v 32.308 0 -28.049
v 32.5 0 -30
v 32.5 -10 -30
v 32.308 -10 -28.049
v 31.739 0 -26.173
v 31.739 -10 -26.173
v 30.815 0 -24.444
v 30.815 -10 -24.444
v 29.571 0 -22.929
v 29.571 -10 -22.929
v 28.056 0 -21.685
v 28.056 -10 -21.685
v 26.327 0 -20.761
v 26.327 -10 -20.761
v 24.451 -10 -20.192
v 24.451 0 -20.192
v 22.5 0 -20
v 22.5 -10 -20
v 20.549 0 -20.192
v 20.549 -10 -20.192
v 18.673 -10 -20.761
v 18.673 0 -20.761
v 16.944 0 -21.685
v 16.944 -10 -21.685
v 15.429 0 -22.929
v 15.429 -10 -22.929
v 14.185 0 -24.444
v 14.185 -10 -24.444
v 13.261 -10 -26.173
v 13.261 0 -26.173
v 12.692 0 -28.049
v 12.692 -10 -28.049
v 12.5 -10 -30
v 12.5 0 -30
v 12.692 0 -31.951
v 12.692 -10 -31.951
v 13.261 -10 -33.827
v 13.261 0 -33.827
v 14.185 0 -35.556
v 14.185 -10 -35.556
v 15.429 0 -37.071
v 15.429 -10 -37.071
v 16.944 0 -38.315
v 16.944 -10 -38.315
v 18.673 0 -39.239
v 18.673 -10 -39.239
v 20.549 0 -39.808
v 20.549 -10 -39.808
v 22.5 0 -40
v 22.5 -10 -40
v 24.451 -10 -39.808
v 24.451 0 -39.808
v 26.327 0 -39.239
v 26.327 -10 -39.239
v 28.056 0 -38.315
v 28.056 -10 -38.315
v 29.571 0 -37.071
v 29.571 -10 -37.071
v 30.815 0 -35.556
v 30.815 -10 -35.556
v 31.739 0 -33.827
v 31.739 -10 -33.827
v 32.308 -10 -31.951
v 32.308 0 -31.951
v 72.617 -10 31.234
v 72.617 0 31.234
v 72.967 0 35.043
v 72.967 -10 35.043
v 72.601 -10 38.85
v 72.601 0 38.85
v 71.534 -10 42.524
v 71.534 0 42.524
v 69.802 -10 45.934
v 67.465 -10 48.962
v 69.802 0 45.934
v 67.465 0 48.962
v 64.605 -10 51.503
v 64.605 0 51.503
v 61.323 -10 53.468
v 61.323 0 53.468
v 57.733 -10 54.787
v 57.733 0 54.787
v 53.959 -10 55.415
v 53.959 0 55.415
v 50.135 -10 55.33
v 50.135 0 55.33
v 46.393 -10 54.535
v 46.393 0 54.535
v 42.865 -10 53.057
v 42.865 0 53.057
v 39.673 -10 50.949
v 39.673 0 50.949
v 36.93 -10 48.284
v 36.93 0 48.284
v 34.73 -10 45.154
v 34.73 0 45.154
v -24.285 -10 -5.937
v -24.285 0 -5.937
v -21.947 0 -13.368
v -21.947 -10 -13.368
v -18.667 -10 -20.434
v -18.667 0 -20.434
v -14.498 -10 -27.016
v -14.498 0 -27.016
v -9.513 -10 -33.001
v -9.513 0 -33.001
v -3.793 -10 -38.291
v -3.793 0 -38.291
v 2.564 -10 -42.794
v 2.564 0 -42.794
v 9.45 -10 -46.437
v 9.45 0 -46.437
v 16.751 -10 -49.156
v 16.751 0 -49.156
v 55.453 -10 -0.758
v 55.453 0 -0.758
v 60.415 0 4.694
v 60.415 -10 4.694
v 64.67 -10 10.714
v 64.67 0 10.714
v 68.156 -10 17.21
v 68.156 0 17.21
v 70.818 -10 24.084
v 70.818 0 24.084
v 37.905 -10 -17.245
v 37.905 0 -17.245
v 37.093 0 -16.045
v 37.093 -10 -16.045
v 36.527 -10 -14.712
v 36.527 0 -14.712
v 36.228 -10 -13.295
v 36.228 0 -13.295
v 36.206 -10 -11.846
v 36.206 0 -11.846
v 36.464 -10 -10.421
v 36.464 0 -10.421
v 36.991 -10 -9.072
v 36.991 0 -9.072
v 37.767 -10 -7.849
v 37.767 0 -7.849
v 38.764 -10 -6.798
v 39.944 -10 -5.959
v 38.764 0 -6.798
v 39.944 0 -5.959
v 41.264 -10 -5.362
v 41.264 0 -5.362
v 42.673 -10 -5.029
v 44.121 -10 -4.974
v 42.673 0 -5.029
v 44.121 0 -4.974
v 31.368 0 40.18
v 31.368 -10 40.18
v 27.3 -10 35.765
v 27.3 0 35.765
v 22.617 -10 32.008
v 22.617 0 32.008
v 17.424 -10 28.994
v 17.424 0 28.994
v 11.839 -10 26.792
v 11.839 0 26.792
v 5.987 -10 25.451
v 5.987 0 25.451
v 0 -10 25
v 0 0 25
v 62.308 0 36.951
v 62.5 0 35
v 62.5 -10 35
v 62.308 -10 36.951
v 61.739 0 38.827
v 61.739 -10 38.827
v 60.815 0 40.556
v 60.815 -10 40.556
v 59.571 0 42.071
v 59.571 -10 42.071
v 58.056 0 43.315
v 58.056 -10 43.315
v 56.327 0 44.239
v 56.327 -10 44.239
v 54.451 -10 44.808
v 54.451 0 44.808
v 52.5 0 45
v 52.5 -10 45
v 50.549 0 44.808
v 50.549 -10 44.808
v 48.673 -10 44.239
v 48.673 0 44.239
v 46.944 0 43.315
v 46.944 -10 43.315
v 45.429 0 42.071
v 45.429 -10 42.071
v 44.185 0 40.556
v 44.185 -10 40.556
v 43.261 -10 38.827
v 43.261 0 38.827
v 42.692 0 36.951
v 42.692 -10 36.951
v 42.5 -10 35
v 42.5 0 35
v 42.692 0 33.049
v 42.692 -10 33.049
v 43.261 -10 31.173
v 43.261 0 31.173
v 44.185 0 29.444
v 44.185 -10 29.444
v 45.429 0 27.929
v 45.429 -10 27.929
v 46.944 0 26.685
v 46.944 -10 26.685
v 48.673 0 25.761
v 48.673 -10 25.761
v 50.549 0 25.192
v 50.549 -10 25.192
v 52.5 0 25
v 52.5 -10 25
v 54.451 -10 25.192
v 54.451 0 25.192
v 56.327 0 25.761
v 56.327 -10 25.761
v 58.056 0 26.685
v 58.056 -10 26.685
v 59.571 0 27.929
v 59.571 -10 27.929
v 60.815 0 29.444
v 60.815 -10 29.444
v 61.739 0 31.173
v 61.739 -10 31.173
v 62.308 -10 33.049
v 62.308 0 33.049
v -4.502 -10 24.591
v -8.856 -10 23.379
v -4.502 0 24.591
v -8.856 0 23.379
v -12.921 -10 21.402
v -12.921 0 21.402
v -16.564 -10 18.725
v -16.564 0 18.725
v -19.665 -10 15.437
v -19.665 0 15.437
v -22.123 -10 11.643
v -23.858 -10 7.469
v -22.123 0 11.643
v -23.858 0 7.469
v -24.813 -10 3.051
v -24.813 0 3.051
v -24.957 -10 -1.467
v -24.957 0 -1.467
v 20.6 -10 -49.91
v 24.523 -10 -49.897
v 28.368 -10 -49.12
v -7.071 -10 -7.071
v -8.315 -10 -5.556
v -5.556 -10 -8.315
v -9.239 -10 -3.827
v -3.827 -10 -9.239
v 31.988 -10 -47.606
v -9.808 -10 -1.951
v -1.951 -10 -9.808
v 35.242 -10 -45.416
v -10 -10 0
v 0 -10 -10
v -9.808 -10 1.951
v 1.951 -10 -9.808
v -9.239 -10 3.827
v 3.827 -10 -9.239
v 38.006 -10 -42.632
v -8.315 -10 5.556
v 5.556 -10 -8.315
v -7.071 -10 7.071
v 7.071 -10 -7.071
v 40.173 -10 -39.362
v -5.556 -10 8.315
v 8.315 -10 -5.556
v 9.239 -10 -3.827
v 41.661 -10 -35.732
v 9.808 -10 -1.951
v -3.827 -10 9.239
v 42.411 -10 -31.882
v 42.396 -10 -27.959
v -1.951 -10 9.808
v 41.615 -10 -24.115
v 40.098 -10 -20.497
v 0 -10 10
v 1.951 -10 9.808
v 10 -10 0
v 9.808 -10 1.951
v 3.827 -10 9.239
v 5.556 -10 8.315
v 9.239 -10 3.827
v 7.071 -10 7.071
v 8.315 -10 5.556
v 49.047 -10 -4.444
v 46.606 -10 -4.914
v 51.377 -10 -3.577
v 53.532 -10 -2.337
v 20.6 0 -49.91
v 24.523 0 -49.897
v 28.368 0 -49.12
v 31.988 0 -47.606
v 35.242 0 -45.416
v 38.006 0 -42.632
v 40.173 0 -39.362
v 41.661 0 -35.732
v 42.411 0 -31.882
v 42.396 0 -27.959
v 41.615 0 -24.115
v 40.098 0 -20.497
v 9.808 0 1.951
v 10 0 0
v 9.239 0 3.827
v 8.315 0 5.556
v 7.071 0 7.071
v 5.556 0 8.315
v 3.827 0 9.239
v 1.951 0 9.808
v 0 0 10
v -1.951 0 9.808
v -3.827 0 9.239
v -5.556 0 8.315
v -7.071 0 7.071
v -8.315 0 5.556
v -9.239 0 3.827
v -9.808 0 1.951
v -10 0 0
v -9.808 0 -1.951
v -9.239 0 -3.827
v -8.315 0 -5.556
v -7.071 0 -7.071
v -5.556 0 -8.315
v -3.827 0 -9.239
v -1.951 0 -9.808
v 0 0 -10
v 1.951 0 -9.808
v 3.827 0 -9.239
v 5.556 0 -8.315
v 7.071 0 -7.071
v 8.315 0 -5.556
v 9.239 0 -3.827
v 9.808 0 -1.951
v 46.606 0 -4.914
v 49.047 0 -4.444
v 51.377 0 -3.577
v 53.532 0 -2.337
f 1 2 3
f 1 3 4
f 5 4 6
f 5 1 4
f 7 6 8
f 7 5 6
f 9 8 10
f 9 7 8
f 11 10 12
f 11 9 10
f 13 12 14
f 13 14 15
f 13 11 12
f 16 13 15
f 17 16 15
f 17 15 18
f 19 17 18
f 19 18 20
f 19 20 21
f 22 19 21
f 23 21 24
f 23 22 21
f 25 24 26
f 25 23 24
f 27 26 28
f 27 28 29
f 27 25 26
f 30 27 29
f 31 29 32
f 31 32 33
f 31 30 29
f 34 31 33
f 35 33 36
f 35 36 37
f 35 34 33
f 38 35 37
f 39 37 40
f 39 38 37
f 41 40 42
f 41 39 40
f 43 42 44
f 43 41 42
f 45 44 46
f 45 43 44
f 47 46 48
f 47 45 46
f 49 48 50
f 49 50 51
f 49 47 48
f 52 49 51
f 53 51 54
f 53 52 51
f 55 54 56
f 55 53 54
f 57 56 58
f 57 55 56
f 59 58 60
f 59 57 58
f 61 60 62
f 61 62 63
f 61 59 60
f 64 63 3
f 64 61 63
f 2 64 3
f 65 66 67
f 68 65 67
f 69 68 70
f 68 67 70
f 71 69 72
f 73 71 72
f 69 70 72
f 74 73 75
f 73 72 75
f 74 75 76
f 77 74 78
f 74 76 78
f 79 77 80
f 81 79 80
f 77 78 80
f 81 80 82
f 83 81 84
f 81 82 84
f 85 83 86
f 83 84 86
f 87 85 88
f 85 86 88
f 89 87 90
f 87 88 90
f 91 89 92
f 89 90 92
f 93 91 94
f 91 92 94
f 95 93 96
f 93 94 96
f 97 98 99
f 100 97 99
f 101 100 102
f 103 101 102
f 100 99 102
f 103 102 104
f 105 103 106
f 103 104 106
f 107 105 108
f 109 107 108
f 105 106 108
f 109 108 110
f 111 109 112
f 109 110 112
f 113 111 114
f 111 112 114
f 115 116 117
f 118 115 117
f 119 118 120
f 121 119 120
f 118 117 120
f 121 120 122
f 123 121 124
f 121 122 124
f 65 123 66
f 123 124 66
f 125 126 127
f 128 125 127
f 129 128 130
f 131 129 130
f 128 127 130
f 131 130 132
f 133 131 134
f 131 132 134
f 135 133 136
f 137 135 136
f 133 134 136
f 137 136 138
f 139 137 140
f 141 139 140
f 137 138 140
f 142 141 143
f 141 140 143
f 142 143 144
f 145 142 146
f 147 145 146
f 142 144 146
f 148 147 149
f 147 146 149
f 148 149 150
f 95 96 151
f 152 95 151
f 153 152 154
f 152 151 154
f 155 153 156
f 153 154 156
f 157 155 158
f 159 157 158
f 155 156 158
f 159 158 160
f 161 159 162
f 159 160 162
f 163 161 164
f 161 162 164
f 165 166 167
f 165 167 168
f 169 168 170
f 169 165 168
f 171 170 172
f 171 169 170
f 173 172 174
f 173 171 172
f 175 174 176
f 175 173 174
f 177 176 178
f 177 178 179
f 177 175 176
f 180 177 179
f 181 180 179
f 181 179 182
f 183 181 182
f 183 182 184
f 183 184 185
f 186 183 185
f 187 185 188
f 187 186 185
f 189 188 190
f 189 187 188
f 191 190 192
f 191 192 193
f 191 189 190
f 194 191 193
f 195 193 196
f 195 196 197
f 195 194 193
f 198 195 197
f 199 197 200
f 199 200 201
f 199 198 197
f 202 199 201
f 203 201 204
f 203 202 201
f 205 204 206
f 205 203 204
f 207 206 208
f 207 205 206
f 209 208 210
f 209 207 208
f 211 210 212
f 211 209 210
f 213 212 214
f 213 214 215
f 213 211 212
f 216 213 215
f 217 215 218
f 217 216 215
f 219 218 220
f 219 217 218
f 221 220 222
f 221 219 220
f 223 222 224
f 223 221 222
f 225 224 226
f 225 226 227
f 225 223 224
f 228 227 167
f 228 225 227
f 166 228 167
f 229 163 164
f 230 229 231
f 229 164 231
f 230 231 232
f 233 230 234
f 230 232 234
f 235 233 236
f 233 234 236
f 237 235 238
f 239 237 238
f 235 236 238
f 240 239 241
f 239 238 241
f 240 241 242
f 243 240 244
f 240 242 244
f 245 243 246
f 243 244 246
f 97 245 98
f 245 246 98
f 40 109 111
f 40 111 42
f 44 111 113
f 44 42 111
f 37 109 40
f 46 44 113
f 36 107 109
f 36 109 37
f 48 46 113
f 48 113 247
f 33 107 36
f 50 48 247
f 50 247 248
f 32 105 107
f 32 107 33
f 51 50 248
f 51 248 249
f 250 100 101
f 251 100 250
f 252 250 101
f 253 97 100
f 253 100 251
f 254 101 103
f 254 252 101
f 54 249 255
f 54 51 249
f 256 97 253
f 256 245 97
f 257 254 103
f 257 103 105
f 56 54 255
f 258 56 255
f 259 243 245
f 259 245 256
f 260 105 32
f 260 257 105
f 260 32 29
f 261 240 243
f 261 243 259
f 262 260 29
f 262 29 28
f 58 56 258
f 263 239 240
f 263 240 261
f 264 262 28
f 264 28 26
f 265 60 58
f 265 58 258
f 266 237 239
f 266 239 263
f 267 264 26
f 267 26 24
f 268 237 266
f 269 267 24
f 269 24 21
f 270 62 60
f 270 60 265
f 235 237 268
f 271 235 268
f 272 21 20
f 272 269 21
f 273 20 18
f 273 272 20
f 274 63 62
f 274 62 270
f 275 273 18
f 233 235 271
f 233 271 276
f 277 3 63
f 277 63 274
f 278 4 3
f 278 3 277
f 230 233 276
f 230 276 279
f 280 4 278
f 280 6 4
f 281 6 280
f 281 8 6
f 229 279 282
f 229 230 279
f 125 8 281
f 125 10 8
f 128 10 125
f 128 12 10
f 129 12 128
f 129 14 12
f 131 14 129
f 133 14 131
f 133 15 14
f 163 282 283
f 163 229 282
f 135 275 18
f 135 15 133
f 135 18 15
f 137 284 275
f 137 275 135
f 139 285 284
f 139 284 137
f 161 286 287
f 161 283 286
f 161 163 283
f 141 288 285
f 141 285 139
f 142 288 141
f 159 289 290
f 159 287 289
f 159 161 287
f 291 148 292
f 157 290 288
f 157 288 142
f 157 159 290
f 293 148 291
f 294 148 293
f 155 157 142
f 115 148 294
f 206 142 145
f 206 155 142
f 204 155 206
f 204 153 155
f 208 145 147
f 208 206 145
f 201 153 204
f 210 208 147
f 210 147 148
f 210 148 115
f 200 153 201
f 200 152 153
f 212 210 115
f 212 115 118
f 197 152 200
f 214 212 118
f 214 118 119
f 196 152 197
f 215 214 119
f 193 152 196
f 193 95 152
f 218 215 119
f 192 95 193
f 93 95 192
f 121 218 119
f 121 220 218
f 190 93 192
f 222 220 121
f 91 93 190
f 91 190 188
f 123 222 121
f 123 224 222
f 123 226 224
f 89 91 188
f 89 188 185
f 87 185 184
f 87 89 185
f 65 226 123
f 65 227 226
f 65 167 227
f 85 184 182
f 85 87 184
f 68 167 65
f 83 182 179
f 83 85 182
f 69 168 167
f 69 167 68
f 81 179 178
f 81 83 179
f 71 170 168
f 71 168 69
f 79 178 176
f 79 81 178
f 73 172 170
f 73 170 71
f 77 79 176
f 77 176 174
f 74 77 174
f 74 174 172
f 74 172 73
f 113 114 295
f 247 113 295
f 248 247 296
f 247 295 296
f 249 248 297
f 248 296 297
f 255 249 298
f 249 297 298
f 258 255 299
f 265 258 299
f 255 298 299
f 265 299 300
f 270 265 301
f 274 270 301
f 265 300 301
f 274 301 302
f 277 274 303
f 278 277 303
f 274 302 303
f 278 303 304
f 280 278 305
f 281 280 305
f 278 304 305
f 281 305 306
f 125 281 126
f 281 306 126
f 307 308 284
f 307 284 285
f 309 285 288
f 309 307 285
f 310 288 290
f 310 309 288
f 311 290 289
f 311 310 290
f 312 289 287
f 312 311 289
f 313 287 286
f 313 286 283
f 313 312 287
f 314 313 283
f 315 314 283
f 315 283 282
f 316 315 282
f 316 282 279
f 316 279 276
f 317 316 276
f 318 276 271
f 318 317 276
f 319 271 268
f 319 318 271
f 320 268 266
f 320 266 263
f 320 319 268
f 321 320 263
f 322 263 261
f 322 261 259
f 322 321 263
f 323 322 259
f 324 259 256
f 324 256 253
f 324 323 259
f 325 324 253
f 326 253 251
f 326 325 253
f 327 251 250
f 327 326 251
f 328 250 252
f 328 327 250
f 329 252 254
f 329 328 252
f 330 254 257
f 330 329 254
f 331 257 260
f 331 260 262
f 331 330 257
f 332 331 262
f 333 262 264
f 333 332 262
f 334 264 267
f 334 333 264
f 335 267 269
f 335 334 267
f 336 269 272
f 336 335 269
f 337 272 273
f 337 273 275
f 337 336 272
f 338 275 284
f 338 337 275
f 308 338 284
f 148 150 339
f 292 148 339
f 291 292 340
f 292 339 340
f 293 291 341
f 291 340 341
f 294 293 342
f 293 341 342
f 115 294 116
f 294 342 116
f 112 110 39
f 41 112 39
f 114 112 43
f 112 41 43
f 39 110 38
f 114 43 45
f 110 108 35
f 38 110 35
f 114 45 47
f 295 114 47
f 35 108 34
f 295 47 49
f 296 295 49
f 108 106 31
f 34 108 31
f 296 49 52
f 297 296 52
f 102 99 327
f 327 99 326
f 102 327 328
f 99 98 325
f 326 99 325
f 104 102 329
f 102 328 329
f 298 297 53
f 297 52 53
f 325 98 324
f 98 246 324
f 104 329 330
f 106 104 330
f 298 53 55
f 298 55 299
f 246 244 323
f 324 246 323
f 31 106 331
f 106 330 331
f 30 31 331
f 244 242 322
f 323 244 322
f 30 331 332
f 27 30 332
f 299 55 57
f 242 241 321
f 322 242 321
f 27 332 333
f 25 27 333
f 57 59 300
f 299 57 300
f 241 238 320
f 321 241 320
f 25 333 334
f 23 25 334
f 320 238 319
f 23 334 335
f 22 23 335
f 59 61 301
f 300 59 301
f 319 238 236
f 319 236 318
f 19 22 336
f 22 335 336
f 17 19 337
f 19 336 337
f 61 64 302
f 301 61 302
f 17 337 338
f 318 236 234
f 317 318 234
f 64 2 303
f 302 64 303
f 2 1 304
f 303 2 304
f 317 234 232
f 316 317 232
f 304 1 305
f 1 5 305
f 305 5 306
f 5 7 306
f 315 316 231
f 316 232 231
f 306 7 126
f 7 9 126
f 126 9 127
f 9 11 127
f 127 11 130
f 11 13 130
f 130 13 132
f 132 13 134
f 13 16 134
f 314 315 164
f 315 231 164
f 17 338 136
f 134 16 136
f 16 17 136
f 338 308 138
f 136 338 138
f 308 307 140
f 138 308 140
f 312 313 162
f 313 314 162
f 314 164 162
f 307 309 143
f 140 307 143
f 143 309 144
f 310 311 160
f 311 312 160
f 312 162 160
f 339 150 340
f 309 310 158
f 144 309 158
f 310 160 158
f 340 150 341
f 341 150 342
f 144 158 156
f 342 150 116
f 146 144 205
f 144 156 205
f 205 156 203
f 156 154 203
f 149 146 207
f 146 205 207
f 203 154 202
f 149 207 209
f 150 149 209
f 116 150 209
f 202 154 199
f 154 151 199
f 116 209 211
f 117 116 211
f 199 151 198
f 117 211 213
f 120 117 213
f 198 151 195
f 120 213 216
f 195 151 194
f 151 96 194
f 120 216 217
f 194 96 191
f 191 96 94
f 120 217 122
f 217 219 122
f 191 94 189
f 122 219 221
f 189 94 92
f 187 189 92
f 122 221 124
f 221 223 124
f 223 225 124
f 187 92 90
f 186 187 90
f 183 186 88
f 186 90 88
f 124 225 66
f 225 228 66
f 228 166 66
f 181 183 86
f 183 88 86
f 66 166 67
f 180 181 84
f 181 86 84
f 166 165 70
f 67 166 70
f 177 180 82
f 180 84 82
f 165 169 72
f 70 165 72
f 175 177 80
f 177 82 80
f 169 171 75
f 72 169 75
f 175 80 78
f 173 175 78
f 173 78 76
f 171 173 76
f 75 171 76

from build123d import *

# Parameters (mm, degrees)
F0_R     = 10
F1_DEPTH = 10


with BuildPart() as f1:
    # F0 (on Front) → F1 (new body)
    with BuildSketch(Plane.XZ):
        with BuildLine():
            ThreePointArc((0, 25), (-19.664959, 15.436625), (-24.284847, -5.93685))
            ThreePointArc((-24.284847, -5.93685), (-9.512511, -33.001447), (16.750607, -49.155795))
            ThreePointArc((16.750607, -49.155795), (39.169931, -41.050494), (37.904534, -17.244596))
            ThreePointArc((37.904534, -17.244596), (36.990811, -9.071889), (44.120823, -4.974213))
            ThreePointArc((44.120823, -4.974213), (50.230306, -4.058588), (55.452633, -0.758367))
            ThreePointArc((55.452633, -0.758367), (66.51285, 13.90815), (72.617387, 31.233557))
            ThreePointArc((72.617387, 31.233557), (59.558682, 54.211204), (34.729726, 45.154442))
            ThreePointArc((34.729726, 45.154442), (20.077073, 30.403596), (0, 25))
        make_face()
        with Locations((22.5, -30)):
            Circle(F0_R, mode=Mode.SUBTRACT)
        Circle(F0_R, mode=Mode.SUBTRACT)
        with Locations((52.5, 35)):
            Circle(F0_R, mode=Mode.SUBTRACT)
    extrude(amount=F1_DEPTH)


solid = f1.part
